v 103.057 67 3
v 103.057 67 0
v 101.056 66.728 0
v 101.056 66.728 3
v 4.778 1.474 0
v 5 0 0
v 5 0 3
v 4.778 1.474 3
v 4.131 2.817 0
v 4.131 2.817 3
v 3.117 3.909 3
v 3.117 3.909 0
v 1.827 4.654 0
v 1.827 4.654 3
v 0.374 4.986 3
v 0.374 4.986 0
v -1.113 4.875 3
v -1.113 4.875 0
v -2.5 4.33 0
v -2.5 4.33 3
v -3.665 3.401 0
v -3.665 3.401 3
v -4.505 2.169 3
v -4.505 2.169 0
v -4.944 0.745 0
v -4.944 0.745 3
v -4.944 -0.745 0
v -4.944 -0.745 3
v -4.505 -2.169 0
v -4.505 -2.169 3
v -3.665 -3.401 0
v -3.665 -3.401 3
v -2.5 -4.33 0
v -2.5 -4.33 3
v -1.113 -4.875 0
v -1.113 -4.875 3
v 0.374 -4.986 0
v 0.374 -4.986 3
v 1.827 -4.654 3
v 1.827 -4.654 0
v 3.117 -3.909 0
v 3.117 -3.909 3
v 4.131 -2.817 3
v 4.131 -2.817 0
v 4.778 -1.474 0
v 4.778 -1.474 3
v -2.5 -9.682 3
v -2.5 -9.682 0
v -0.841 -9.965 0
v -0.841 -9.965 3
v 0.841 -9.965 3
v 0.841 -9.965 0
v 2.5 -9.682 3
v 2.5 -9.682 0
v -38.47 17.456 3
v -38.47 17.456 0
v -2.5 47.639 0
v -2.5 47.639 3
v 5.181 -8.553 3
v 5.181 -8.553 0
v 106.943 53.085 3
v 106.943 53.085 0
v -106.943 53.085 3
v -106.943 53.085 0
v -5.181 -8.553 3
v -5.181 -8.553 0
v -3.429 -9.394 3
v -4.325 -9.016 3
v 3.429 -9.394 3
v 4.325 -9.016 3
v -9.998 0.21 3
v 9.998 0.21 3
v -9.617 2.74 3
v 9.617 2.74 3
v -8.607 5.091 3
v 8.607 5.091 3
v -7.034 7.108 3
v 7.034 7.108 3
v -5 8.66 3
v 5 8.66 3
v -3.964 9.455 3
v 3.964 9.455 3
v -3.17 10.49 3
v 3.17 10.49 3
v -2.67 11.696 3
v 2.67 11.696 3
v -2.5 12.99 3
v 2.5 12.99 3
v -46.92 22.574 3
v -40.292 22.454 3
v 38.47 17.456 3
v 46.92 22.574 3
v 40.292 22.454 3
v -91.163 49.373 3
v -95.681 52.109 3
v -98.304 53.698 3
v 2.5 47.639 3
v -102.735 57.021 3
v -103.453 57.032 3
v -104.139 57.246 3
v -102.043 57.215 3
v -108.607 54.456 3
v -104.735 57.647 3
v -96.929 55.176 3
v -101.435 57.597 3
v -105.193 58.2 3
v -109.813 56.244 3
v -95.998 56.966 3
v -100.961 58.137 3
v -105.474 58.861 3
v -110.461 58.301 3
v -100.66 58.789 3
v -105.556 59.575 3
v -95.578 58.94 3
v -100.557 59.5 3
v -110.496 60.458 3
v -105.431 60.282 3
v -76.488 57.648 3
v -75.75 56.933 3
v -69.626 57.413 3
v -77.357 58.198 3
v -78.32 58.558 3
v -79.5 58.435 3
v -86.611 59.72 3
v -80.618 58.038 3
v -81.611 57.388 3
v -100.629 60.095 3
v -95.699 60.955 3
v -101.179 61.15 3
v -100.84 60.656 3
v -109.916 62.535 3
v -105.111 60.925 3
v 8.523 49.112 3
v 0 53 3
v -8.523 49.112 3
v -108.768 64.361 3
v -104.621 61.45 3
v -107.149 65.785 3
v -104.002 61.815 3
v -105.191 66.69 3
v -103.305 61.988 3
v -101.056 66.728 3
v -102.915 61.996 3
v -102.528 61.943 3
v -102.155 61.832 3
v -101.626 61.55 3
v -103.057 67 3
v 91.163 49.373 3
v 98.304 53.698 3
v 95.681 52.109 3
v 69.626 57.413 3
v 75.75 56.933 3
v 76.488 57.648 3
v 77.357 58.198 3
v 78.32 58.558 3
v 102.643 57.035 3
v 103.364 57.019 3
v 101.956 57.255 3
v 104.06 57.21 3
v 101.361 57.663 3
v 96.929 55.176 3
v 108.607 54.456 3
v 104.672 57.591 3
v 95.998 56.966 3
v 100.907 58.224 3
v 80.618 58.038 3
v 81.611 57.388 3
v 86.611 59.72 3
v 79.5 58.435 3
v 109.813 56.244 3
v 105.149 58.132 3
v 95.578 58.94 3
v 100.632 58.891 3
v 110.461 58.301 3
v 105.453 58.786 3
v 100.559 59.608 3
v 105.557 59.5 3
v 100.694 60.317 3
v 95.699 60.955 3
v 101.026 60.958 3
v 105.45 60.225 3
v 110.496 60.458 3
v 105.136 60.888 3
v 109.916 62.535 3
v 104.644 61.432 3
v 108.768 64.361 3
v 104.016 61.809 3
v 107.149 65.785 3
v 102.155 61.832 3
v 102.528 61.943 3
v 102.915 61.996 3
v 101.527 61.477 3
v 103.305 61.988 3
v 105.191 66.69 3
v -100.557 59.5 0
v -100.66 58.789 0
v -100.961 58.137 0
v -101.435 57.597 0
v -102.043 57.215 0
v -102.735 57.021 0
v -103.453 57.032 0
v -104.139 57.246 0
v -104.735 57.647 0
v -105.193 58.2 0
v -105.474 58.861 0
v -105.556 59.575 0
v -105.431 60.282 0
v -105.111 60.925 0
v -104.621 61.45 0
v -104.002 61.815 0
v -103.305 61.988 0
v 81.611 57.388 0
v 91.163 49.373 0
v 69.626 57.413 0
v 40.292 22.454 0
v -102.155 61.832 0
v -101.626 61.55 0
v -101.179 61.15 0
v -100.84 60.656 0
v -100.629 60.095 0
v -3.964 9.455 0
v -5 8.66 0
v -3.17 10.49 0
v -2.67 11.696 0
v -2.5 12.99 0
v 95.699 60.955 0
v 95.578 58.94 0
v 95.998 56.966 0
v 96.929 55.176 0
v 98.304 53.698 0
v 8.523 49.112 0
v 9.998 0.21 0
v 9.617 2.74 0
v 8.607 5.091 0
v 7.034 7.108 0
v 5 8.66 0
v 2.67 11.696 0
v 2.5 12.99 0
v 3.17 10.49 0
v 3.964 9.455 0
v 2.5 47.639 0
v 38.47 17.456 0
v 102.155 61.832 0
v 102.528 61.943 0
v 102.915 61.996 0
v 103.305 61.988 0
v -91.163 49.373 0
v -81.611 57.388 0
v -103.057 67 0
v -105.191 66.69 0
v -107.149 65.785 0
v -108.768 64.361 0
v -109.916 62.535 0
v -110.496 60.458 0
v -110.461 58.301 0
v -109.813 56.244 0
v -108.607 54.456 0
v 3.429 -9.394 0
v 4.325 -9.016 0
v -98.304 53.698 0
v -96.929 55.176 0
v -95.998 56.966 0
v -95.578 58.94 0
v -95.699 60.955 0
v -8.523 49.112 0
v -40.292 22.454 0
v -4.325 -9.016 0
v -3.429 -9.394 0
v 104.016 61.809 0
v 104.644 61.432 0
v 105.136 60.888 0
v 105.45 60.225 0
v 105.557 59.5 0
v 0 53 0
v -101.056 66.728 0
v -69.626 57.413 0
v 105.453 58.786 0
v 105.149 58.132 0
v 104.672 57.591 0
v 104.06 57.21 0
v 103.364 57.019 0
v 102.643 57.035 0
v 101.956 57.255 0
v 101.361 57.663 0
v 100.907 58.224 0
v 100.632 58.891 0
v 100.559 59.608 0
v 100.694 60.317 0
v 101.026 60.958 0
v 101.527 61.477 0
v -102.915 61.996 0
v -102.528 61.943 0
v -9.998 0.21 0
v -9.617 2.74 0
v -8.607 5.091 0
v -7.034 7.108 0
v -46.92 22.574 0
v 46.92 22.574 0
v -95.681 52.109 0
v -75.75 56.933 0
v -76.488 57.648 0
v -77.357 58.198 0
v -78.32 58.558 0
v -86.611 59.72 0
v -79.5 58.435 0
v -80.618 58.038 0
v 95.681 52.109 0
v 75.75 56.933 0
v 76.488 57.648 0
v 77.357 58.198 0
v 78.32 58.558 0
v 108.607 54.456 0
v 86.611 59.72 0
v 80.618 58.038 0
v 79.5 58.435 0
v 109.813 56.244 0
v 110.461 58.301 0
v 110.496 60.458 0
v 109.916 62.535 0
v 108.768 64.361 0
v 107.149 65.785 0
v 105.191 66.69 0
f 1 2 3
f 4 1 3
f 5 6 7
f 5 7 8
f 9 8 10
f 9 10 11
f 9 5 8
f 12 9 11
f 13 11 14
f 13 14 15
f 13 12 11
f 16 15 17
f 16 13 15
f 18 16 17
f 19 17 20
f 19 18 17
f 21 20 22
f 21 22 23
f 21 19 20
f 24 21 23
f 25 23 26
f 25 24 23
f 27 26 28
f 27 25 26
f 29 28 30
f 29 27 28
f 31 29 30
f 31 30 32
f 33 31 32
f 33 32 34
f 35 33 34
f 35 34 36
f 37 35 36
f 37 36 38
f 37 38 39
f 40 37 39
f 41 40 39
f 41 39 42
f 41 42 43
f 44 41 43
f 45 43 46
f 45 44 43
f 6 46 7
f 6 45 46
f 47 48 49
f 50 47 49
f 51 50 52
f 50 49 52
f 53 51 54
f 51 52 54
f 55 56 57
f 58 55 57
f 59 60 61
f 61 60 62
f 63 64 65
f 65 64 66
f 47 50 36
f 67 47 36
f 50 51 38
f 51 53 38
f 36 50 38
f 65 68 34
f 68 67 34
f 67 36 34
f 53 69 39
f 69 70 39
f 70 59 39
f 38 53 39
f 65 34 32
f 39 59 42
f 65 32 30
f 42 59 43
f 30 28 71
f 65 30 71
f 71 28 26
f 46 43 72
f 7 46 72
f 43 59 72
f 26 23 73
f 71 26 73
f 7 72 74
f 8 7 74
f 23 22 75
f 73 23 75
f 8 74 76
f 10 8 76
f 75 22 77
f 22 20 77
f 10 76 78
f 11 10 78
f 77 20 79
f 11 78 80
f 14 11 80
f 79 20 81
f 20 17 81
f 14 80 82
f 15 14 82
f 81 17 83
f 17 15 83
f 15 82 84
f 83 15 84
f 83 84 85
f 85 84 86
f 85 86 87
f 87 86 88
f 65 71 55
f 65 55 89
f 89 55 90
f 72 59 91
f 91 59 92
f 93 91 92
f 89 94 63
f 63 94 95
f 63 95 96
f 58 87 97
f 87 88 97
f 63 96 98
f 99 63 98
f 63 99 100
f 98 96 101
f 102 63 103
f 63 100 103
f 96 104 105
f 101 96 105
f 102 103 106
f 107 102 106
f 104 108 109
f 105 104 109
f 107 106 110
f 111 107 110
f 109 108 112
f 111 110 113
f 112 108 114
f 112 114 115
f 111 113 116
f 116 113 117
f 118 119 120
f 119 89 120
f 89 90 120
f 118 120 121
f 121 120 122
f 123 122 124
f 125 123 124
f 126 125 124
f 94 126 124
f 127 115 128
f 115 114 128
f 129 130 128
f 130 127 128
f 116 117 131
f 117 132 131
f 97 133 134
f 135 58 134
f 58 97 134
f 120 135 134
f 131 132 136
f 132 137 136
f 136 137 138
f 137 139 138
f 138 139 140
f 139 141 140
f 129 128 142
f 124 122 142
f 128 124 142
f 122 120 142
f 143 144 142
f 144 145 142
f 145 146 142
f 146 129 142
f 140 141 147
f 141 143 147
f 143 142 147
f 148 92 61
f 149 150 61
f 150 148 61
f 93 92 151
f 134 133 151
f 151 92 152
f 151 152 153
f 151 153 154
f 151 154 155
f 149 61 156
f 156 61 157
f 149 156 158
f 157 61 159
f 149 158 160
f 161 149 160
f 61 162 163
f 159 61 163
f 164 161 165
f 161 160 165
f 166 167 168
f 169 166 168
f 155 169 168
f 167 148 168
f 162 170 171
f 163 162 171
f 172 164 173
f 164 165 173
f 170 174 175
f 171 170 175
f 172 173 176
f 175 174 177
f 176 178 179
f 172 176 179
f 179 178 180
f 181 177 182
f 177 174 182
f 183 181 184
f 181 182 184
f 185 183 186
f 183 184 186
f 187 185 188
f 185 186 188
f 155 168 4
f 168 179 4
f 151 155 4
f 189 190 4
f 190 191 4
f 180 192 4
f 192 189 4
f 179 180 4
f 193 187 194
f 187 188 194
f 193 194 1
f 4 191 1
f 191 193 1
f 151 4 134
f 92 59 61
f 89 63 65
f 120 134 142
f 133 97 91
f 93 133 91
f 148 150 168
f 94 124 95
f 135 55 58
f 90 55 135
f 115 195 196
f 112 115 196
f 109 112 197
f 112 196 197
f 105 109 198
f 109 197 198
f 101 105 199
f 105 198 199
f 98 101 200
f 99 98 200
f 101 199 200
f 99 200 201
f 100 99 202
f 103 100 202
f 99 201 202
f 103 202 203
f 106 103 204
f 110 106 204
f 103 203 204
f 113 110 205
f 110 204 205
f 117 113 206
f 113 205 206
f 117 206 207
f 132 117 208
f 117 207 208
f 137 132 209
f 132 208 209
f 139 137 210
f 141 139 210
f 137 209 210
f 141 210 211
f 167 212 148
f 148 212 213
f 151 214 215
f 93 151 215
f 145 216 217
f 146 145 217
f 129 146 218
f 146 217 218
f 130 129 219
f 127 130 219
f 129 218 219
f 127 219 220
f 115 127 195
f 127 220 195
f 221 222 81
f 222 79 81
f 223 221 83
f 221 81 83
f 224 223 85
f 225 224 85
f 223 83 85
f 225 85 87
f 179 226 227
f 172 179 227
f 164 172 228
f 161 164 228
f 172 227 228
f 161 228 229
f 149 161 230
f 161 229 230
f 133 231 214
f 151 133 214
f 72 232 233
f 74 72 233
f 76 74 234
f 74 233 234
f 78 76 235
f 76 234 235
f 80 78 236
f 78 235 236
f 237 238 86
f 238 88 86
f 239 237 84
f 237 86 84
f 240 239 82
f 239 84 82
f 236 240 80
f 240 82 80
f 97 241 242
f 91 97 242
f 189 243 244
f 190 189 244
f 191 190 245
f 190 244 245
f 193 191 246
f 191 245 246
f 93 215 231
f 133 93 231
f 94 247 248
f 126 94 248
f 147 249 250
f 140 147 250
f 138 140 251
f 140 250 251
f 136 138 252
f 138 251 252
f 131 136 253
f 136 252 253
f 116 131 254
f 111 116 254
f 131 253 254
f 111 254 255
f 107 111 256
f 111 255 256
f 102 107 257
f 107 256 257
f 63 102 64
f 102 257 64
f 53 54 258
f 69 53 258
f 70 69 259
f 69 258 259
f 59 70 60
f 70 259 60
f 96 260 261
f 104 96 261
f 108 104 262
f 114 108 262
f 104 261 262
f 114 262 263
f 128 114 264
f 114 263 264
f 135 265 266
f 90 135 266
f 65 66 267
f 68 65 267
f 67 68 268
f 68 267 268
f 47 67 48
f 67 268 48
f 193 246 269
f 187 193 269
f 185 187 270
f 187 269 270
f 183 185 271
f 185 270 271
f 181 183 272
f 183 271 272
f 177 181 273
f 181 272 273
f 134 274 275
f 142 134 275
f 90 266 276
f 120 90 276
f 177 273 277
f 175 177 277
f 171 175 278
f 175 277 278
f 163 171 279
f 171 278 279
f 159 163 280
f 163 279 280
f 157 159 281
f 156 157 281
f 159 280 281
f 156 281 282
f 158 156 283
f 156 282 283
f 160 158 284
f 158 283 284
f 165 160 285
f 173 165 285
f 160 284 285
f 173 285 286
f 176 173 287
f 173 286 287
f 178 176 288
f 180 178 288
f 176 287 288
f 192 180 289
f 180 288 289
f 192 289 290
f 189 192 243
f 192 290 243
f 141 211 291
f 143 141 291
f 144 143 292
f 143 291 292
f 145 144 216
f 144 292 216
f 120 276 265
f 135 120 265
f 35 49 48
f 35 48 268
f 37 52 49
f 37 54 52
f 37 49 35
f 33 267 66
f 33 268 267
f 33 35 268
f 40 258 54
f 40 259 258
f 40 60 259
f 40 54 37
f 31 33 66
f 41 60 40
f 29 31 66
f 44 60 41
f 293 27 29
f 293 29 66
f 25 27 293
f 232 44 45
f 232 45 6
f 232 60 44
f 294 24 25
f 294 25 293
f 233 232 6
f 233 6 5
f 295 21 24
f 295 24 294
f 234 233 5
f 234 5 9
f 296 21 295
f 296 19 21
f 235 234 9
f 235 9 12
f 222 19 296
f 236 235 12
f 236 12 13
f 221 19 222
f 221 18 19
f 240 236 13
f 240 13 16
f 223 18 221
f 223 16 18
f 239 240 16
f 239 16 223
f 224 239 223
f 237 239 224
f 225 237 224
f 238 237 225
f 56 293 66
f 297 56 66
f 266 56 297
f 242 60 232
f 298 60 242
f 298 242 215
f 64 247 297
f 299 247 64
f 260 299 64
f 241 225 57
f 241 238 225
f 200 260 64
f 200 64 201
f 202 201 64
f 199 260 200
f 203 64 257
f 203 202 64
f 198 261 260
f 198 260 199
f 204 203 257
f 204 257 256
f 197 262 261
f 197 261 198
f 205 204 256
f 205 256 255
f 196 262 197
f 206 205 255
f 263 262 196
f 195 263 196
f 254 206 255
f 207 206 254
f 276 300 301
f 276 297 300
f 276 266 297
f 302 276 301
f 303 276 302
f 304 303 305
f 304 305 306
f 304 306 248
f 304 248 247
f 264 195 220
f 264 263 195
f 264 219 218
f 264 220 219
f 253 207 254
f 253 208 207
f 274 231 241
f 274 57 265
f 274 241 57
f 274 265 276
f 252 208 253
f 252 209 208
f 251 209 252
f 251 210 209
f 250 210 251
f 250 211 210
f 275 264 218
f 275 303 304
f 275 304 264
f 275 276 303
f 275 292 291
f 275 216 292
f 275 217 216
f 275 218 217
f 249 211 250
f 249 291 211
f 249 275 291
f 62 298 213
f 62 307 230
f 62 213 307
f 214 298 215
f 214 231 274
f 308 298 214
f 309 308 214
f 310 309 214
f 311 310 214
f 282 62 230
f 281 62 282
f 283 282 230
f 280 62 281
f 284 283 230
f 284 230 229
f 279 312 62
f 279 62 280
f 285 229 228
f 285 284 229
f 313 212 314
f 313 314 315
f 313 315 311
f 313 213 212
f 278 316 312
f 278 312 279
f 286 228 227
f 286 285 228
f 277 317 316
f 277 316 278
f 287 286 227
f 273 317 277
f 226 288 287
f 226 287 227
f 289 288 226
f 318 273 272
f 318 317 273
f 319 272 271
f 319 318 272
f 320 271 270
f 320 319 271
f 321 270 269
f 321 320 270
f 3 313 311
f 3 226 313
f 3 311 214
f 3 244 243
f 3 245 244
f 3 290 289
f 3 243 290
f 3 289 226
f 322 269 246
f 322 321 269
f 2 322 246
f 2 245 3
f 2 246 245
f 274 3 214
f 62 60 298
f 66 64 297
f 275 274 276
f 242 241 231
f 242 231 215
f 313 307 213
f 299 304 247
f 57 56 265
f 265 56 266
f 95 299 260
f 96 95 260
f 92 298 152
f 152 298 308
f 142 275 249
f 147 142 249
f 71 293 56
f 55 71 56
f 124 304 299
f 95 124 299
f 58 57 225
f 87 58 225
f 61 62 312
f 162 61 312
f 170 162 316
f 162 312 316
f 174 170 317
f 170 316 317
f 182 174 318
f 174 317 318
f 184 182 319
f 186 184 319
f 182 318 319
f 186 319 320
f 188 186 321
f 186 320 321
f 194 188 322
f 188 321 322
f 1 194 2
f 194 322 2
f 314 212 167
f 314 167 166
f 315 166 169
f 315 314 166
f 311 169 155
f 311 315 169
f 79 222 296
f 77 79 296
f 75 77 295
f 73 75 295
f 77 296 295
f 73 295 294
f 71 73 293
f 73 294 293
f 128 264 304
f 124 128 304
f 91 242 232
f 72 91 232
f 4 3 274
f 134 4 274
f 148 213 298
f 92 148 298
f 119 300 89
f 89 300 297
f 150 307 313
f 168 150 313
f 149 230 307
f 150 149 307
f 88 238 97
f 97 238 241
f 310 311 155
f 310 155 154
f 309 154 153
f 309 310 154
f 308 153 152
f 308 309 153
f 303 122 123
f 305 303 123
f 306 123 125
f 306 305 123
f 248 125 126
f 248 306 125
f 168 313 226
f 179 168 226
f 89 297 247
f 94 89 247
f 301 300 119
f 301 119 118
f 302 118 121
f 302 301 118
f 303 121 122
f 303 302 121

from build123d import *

# Parameters (mm, degrees)
SKETCH_1_R      = 5
EXTRUDE_1_DEPTH = 3
FILLET_1_R      = 5
FILLET_2_R      = 5
FILLET_3_R      = 5


with BuildPart() as part:
    # 草图1 → 凸台-拉伸1 (new body)
    with BuildSketch(Plane.XY):
        with BuildLine():
            Line((101.056239558, 66.72819932), (0, 53))
            Line((0, 53), (-101.056239558, 66.72819932))
            Line((-101.056239558, 66.72819932), (-103.05702305, 67))
            ThreePointArc((-103.05702305, 67), (-110.280675742, 61.517137029), (-106.942649005, 53.085024478))
            Line((-106.942649005, 53.085024478), (-5.180834606, -8.553300696))
            ThreePointArc((-5.180834606, -8.553300696), (-3.881694774, -9.215880082), (-2.5, -9.682458366))
            ThreePointArc((-2.5, -9.682458366), (0, -10), (2.5, -9.682458366))
            ThreePointArc((2.5, -9.682458366), (3.881694774, -9.215880082), (5.180834606, -8.553300696))
            Line((5.180834606, -8.553300696), (106.942649005, 53.085024478))
            ThreePointArc((106.942649005, 53.085024478), (110.280675742, 61.517137029), (103.05702305, 67))
            Line((103.05702305, 67), (101.056239558, 66.72819932))
        make_face()
        Circle(SKETCH_1_R, mode=Mode.SUBTRACT)
        with BuildLine():
            Line((-38.470197272, 17.456153435), (-2.5, 47.638732699))
            Line((-2.5, 47.638732699), (-2.5, 9.682458366))
            ThreePointArc((-2.5, 9.682458366), (-7.840929555, 6.206434058), (-9.997792991, 0.210084034))
            Line((-9.997792991, 0.210084034), (-38.470197272, 17.456153435))
        make_face(mode=Mode.SUBTRACT)
        with BuildLine():
            Line((38.470197272, 17.456153435), (9.997792991, 0.210084034))
            ThreePointArc((9.997792991, 0.210084034), (7.840929555, 6.206434058), (2.5, 9.682458366))
            Line((2.5, 9.682458366), (2.5, 47.638732699))
            Line((2.5, 47.638732699), (38.470197272, 17.456153435))
        make_face(mode=Mode.SUBTRACT)
        Polygon((-76.992375251, 58.413267417), (-46.919815599, 22.574186413), (-91.163166243, 49.372903102), (-79.915961764, 58.810428231), align=None, mode=Mode.SUBTRACT)
        Polygon((-69.625606174, 57.412513038), (-8.52297152, 49.111895964), (-40.292213402, 22.454336819), align=None, mode=Mode.SUBTRACT)
        with BuildLine():
            Line((-95.680736217, 52.109248249), (-98.304134778, 53.698271544))
            ThreePointArc((-98.304134778, 53.698271544), (-95.998027486, 56.966113336), (-95.699425849, 60.954566405))
            Line((-95.699425849, 60.954566405), (-86.610723734, 59.719892378))
            Line((-86.610723734, 59.719892378), (-95.680736217, 52.109248249))
        make_face(mode=Mode.SUBTRACT)
        with BuildLine():
            ThreePointArc((-103.304614869, 61.987709447), (-102.720496256, 61.977246398), (-102.154754916, 61.831504281))
            ThreePointArc((-102.154754916, 61.831504281), (-100.994782723, 60.913210824), (-100.55702305, 59.5))
            ThreePointArc((-100.55702305, 59.5), (-104.73497127, 57.646762354), (-103.304614869, 61.987709447))
        make_face(mode=Mode.SUBTRACT)
        Polygon((40.292213402, 22.454336819), (8.52297152, 49.111895964), (69.625606174, 57.412513038), align=None, mode=Mode.SUBTRACT)
        Polygon((91.163166243, 49.372903102), (46.919815599, 22.574186413), (76.992375251, 58.413267417), (79.915961764, 58.810428231), align=None, mode=Mode.SUBTRACT)
        with BuildLine():
            Line((95.680736217, 52.109248249), (86.610723734, 59.719892378))
            Line((86.610723734, 59.719892378), (95.699425849, 60.954566405))
            ThreePointArc((95.699425849, 60.954566405), (95.998027486, 56.966113336), (98.304134778, 53.698271544))
            Line((98.304134778, 53.698271544), (95.680736217, 52.109248249))
        make_face(mode=Mode.SUBTRACT)
        with BuildLine():
            ThreePointArc((105.55702305, 59.5), (101.643812227, 57.437759673), (102.154754916, 61.831504281))
            ThreePointArc((102.154754916, 61.831504281), (102.720496256, 61.977246398), (103.304614869, 61.987709447))
            ThreePointArc((103.304614869, 61.987709447), (104.910260696, 61.177948219), (105.55702305, 59.5))
        make_face(mode=Mode.SUBTRACT)
    extrude(amount=EXTRUDE_1_DEPTH)

    # 圆角1
    # the kernel refuses this fillet: 5 mm, written as the material it adds along each edge
    with BuildSketch(Plane(origin=(76.992375251, 58.413267417, 0), x_dir=(0.9908985592379703, 0.1346107176272178, 0), z_dir=(0, 0, 1))) as fillet_1_piece_1:
        with BuildLine():
            CenterArc((FILLET_1_R * 0.386508582556, -FILLET_1_R), FILLET_1_R, 90, 42.263889815)
            Line((-FILLET_1_R * 0.286037651021, -FILLET_1_R * 0.259944891443), (0, 0))
            Line((0, 0), (FILLET_1_R * 0.386508582556, 0))
        make_face()
    extrude(amount=3)
    with BuildSketch(Plane(origin=(79.915961764, 58.810428231, 0), x_dir=(0.7660444431189772, -0.6427876096865403, 0), z_dir=(0, 0, 1))) as fillet_1_piece_2:
        with BuildLine():
            CenterArc((FILLET_1_R * 0.442472138408, -FILLET_1_R), FILLET_1_R, 90, 47.736110185)
            Line((-FILLET_1_R * 0.297582970149, -FILLET_1_R * 0.327453766423), (0, 0))
            Line((0, 0), (FILLET_1_R * 0.442472138408, 0))
        make_face()
    extrude(amount=3)

    # 圆角2
    # the kernel refuses this fillet: 5 mm, written as the material it adds along each edge
    with BuildSketch(Plane(origin=(-79.915961764, 58.810428231, 0), x_dir=(0.9908985592379704, -0.13461071762721746, 0), z_dir=(0, 0, 1))) as fillet_2_piece_1:
        with BuildLine():
            CenterArc((FILLET_2_R * 0.442472138408, -FILLET_2_R), FILLET_2_R, 90, 47.736110185)
            Line((-FILLET_2_R * 0.297582970149, -FILLET_2_R * 0.327453766423), (0, 0))
            Line((0, 0), (FILLET_2_R * 0.442472138408, 0))
        make_face()
    extrude(amount=3)
    with BuildSketch(Plane(origin=(-76.992375251, 58.413267417, 0), x_dir=(0.642787609686538, -0.7660444431189791, 0), z_dir=(0, 0, 1))) as fillet_2_piece_2:
        with BuildLine():
            CenterArc((FILLET_2_R * 0.386508582556, -FILLET_2_R), FILLET_2_R, 90, 42.263889815)
            Line((-FILLET_2_R * 0.286037651021, -FILLET_2_R * 0.259944891443), (0, 0))
            Line((0, 0), (FILLET_2_R * 0.386508582556, 0))
        make_face()
    extrude(amount=3)

    # 圆角3
    fillet_3_edges = [part.edges().sort_by_distance(p)[0] for p in [
        (-2.5, 9.682458366, 1.5),
        (2.5, 9.682458366, 1.5),
    ]]
    fillet(fillet_3_edges, radius=FILLET_3_R)


solid = part.part
